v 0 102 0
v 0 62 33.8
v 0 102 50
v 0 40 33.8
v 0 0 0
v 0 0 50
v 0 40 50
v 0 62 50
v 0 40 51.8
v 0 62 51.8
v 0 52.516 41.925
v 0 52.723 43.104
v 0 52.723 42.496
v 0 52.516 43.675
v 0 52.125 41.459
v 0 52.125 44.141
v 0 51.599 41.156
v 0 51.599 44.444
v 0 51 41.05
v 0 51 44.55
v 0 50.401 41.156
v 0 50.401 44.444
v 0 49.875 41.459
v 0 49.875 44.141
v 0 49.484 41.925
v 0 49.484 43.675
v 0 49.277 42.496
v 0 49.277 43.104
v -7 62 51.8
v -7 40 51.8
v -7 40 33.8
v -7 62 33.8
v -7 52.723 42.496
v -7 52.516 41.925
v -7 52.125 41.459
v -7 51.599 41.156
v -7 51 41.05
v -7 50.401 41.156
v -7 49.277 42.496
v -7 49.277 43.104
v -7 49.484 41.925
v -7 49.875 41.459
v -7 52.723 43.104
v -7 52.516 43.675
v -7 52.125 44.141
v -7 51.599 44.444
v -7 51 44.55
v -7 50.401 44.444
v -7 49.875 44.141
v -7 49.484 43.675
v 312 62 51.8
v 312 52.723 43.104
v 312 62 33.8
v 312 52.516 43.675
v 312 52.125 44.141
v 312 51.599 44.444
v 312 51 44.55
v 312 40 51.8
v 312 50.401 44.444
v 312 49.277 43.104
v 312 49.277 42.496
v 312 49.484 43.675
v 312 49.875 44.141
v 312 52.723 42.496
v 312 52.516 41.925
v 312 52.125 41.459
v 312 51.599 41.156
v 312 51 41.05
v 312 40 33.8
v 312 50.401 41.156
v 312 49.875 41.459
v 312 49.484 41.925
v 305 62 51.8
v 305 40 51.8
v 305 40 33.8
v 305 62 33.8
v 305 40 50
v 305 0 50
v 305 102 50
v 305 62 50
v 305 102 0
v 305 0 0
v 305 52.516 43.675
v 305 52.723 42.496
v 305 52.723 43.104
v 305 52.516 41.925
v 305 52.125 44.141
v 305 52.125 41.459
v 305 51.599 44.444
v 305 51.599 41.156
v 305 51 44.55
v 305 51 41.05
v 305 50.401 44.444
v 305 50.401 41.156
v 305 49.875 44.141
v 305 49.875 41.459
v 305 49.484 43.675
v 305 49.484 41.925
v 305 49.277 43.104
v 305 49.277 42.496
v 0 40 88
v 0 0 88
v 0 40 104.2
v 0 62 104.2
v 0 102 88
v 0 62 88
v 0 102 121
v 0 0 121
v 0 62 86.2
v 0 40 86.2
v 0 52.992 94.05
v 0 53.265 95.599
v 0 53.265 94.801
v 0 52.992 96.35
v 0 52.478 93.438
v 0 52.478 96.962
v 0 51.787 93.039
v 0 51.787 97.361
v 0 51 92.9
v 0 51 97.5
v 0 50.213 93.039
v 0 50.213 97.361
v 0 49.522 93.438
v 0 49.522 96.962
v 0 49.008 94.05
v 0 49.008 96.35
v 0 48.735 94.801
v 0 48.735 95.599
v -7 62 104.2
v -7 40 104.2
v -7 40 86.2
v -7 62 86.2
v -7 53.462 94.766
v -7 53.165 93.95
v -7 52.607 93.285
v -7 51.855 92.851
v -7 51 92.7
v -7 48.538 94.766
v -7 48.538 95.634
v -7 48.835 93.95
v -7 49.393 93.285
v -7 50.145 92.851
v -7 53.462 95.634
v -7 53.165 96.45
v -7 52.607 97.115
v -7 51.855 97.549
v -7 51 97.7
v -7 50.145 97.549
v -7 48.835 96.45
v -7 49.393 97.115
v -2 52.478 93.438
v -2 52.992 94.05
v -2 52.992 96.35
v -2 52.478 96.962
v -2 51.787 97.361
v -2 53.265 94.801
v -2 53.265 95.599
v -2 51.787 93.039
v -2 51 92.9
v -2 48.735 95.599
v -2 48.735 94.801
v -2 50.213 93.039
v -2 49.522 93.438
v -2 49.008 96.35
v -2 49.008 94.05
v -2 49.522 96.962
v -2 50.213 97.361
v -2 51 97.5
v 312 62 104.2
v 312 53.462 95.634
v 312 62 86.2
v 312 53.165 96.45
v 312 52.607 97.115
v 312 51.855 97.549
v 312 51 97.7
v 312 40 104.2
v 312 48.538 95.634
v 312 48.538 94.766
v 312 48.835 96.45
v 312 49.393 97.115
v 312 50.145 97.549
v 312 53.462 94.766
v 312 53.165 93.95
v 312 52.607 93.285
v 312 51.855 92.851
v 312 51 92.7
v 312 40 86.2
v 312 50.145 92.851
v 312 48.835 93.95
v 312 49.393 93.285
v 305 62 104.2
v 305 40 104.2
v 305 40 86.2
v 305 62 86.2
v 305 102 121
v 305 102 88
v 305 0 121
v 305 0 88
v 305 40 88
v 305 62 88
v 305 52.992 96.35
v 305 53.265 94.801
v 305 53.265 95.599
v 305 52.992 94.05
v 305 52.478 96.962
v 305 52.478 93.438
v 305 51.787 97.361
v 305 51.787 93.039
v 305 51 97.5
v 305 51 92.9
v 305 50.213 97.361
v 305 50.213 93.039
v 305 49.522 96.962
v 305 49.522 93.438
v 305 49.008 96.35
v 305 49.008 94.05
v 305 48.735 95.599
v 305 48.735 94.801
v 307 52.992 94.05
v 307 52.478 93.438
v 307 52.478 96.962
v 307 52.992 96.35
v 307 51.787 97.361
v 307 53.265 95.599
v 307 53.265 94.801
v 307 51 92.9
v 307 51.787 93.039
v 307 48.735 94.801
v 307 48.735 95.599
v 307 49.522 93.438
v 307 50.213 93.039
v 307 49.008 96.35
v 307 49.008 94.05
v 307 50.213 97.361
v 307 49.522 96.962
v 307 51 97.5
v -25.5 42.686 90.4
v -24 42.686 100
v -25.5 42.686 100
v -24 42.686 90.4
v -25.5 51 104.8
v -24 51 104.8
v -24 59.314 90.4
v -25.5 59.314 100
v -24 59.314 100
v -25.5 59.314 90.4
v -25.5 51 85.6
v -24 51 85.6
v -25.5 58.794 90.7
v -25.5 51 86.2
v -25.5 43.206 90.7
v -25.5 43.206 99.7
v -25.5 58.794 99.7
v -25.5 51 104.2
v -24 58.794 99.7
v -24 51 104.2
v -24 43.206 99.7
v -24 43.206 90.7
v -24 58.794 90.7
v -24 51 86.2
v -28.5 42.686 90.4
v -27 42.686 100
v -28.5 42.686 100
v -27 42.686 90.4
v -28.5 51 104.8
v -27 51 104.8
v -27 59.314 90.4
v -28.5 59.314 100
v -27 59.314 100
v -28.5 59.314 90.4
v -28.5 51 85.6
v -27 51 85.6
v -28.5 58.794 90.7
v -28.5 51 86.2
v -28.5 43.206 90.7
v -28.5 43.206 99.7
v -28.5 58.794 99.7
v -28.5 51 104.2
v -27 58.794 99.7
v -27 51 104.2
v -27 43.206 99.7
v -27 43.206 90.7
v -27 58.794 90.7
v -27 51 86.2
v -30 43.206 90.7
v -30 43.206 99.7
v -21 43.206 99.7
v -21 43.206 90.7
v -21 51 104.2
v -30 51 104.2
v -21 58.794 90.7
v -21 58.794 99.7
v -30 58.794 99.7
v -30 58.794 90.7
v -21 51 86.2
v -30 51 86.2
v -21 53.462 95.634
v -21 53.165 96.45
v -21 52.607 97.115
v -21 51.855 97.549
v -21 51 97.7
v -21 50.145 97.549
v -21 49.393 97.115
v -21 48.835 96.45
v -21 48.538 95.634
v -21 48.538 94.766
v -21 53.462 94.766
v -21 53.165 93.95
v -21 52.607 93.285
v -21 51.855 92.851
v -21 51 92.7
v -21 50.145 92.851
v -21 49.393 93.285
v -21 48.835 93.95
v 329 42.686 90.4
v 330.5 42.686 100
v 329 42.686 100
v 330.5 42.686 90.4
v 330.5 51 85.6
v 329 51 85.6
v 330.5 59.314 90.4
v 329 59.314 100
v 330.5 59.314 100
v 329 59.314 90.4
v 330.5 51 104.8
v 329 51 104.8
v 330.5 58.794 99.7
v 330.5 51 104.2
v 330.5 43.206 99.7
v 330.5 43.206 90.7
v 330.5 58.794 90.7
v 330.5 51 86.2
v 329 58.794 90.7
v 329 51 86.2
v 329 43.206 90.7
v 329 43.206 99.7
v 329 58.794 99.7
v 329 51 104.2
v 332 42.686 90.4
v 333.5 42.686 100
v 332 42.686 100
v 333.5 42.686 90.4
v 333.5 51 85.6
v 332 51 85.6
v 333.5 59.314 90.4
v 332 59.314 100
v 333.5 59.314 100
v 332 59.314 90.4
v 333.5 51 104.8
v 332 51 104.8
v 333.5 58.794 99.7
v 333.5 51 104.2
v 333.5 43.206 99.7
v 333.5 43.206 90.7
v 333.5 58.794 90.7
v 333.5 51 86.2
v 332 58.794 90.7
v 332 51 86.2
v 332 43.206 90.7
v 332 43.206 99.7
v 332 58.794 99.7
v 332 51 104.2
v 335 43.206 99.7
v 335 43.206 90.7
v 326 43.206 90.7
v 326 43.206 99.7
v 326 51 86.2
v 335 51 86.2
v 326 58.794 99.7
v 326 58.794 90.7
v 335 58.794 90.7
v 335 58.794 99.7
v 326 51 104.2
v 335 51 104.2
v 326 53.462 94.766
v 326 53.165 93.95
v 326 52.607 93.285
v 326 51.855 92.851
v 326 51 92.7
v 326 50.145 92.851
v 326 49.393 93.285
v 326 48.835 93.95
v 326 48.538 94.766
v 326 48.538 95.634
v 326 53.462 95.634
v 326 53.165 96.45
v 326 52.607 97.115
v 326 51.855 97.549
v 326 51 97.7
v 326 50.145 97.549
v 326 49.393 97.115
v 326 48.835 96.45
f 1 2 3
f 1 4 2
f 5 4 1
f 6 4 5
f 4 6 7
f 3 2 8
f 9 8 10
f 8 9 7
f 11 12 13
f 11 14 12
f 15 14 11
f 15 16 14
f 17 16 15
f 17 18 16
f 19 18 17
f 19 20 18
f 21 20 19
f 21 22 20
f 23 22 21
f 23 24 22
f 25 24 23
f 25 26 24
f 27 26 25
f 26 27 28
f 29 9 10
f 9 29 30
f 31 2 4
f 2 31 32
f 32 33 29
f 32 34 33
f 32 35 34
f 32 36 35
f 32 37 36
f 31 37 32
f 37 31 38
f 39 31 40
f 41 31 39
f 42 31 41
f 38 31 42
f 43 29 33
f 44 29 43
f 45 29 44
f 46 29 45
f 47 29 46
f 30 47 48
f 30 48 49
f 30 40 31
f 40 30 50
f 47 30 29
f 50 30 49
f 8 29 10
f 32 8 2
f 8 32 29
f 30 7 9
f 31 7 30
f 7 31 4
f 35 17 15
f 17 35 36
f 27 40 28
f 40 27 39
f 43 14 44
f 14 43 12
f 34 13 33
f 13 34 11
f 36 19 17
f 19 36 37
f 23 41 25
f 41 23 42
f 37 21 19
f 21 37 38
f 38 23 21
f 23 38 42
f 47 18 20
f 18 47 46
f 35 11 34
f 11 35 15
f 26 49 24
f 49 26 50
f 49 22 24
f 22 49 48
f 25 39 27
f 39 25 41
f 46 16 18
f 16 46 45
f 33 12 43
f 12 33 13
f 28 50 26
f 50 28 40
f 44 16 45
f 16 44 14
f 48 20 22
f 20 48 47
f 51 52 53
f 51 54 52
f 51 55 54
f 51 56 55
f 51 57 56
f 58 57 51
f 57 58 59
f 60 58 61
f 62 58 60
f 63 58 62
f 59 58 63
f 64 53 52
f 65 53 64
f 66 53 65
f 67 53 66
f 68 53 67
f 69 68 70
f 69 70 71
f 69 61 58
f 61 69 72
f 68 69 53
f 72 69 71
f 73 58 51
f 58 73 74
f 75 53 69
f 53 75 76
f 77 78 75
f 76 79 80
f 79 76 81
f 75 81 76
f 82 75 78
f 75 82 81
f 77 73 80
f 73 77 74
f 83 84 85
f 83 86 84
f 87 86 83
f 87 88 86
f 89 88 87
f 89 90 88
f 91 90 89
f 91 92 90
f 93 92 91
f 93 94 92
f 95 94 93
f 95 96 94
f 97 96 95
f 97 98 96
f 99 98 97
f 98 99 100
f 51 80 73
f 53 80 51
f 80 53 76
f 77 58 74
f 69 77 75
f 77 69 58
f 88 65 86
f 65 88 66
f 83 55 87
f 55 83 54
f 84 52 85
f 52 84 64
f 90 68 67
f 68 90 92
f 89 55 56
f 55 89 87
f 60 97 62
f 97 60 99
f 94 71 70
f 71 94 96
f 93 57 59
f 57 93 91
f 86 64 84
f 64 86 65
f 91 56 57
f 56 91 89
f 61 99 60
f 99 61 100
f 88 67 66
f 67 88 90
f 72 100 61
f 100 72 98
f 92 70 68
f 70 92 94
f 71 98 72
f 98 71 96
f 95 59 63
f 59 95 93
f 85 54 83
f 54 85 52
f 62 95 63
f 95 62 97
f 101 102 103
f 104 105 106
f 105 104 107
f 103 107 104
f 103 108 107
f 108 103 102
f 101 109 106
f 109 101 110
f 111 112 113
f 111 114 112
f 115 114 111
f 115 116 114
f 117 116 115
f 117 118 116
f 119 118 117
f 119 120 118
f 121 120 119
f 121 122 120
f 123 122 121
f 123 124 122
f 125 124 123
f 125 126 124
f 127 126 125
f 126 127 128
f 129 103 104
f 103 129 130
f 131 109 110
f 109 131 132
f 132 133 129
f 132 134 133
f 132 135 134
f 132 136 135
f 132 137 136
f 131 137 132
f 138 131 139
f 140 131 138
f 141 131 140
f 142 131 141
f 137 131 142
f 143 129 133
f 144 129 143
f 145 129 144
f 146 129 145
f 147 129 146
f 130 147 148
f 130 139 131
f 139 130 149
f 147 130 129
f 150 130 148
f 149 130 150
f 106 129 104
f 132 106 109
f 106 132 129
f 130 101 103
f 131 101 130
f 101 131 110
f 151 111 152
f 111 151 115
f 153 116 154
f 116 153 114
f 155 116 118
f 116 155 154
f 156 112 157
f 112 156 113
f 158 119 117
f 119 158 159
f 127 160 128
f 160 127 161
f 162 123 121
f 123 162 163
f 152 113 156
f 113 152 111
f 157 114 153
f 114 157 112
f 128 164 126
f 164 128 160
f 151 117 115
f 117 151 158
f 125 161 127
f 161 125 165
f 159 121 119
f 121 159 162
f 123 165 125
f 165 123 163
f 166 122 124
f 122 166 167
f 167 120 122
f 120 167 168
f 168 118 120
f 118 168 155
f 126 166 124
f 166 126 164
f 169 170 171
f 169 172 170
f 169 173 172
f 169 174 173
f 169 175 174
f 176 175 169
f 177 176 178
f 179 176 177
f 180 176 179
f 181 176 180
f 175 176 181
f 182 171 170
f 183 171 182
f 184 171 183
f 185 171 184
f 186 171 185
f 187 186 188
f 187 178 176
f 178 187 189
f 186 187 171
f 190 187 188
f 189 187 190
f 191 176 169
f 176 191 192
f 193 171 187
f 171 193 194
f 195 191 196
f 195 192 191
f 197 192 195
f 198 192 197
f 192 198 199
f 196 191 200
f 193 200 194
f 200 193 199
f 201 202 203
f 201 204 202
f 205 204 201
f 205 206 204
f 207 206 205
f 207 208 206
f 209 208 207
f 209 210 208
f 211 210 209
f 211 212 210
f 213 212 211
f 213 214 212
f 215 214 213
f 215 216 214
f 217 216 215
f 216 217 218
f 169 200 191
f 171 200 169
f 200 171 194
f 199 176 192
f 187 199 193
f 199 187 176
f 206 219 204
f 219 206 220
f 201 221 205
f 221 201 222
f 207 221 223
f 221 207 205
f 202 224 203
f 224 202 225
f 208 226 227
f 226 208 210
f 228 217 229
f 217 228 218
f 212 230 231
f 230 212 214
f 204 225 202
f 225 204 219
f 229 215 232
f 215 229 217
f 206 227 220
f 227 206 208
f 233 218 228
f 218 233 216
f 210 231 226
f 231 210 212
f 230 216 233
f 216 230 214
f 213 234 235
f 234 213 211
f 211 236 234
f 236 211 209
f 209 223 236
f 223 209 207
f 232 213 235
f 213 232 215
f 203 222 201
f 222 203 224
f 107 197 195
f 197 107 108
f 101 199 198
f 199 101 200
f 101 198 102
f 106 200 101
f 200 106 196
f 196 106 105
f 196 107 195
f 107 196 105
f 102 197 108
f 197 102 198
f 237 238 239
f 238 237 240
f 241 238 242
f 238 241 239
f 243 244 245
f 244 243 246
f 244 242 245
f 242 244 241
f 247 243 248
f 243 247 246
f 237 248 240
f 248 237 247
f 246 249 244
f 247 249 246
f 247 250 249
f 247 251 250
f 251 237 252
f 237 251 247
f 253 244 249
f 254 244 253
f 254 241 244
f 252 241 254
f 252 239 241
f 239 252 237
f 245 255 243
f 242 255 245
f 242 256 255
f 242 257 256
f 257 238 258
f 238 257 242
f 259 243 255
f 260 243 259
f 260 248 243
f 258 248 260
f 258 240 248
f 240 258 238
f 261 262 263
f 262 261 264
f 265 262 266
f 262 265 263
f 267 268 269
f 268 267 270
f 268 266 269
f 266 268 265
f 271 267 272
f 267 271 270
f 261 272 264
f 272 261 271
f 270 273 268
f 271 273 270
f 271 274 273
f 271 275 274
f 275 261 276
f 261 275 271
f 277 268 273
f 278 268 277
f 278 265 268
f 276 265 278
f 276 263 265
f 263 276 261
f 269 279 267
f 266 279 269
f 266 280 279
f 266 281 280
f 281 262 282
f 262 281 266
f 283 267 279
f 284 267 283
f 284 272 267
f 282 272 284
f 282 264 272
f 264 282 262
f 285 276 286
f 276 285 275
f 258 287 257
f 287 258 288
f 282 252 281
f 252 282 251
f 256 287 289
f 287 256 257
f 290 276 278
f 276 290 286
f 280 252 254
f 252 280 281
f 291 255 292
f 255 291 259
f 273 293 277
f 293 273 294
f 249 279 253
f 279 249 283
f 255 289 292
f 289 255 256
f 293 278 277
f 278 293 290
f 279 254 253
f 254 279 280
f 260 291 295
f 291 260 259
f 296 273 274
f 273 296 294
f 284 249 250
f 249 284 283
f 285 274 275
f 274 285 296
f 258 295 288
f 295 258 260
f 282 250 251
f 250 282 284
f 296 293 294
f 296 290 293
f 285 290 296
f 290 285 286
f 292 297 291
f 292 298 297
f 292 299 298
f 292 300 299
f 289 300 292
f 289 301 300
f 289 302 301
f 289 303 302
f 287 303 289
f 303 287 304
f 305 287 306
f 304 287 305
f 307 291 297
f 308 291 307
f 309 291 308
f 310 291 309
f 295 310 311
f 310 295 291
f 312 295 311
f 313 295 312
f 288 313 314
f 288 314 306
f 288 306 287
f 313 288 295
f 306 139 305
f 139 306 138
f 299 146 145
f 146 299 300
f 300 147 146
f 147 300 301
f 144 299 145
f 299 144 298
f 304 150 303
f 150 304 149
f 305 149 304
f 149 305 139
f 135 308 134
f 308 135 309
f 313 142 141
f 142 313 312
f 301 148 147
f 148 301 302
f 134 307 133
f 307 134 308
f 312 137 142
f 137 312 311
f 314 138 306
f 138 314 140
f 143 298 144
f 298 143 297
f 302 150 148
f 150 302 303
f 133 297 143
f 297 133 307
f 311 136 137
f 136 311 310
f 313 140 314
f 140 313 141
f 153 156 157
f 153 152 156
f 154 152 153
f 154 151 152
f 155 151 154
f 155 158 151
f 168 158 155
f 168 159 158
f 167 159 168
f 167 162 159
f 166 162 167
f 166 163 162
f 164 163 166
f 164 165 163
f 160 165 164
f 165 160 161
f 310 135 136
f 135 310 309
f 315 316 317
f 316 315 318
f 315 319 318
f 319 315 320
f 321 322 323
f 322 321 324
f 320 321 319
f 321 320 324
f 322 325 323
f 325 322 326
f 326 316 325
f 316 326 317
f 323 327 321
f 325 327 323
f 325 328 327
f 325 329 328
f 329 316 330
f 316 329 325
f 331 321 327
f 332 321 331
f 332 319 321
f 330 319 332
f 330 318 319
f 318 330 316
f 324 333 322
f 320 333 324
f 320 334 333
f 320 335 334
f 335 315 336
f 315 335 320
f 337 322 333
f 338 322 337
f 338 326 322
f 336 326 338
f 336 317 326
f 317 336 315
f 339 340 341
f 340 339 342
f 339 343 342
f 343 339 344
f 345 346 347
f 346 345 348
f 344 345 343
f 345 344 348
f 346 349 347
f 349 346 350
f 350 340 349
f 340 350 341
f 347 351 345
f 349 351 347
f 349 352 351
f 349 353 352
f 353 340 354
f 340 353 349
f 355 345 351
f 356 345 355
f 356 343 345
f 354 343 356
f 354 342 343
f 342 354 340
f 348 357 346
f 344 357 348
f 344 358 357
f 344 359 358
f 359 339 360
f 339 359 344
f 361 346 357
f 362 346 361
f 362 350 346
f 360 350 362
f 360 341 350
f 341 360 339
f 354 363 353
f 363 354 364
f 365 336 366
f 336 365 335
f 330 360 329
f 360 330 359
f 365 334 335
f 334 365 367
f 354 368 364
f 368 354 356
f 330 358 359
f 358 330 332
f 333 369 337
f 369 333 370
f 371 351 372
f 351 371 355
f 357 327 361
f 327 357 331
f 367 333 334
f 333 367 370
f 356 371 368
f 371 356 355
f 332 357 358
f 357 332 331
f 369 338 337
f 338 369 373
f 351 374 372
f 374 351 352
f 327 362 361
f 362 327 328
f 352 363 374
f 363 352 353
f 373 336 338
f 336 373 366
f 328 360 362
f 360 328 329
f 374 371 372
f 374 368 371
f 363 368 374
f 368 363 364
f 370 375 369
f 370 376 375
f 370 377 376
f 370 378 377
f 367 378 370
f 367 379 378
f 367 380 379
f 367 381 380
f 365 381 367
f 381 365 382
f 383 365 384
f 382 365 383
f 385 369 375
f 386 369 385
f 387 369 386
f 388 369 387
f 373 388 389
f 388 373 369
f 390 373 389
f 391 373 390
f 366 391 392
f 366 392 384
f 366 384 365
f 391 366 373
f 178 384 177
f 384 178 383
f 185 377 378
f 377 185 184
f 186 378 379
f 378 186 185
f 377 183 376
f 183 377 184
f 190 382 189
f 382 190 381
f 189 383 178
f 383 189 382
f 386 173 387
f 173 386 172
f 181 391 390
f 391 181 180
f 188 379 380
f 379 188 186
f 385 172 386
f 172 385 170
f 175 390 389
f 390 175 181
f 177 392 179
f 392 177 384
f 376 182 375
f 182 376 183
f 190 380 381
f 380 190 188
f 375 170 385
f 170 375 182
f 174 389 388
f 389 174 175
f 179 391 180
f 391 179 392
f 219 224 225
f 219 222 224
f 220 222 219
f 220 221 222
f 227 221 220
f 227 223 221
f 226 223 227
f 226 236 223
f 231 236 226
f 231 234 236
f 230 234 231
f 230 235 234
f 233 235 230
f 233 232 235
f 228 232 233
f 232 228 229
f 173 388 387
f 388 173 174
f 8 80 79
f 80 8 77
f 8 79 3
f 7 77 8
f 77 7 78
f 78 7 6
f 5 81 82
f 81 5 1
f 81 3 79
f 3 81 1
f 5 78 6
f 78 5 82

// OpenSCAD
// 04_captive_thumbscrew_boss.scad
// Printed ear-boss on each short end of the lower tray (outer face, near top).
// A matching flange ear on the upper tray aligns over it.
// An M4 thumbscrew passes through the upper flange and threads into the lower boss,
// clamping the trays together. One boss per short end (2 total).
// ENGAGE: press trays together, twist thumbscrew finger-tight.
// RELEASE: unscrew thumbscrew ~5 turns; lift upper tray.
//
// explode=0  → engaged
// explode=38 → exploded/open

explode = 38;

lx=305; ly=102; lz=50;
ux=305; uy=102; uz=33;

m4_clear  = 4.6;   // clearance hole Ø
m4_tap    = 3.5;   // printed thread Ø
ear_w     = 22;    // ear width in Y (centred on tray)
ear_h     = 18;    // ear height in Z
ear_t     = 7;     // ear protrusion in X from end face
knurl_d   = 18;    // thumbscrew head Ø
knurl_h   = 9;
shaft_d   = 5;

// Lower ear is at top of lower tray, centred at Z = lz - ear_h*0.4
// so ~60% of ear height is in lower tray, ~40% straddles the joint
lower_ear_cz = lz - ear_h * 0.4;
// Upper flange ear mirrors: in upper tray local Z it's at +ear_h*0.4
upper_ear_cz_local = ear_h * 0.4;  // in upper tray local coords

module lower_tray() { color("SteelBlue",0.85)    cube([lx,ly,lz]); }
module upper_tray() { color("LightSkyBlue",0.85) cube([ux,uy,uz]); }

// Ear protruding outward from end face
module ear_body(side, x_off, cz, tapped) {
    x0 = (side==0) ? x_off - ear_t : x_off;
    difference() {
        translate([x0, ly/2 - ear_w/2, cz - ear_h/2])
            cube([ear_t, ear_w, ear_h]);
        translate([(side==0) ? x0-0.1 : x0-0.1, ly/2, cz])
            rotate([0, 90, 0])
                cylinder(d = tapped ? m4_tap : m4_clear, h=ear_t+0.2, $fn=18);
    }
}

// Lower tray + lower ears
lower_tray();
color("DarkOrange",0.92)
for(s=[0,1]) {
    x_off = (s==0) ? 0 : lx;
    ear_body(s, x_off, lower_ear_cz, true);
}

// Upper tray + upper flanges (lifted by explode)
translate([0, 0, lz + explode]) {
    upper_tray();
    color("CornflowerBlue",0.92)
    for(s=[0,1]) {
        x_off = (s==0) ? 0 : ux;
        ear_body(s, x_off, upper_ear_cz_local, false);
    }
}

// Thumbscrews — shown alongside upper tray when exploded
// World Z of upper ear centres = lz + explode + upper_ear_cz_local
for(s=[0,1]) {
    ear_world_z = lz + explode + upper_ear_cz_local;
    head_x = (s==0) ? -(ear_t + knurl_h + 5) : lx + ear_t + knurl_h + 5;
    color("Silver",0.95)
    translate([head_x, ly/2, ear_world_z])
    rotate([0, (s==0) ? -90 : 90, 0]) {
        cylinder(d=knurl_d, h=knurl_h, $fn=6);
        for(i=[1,2])
            translate([0,0, i*(knurl_h/3)])
                difference() {
                    cylinder(d=knurl_d+1.2, h=1.5, $fn=6);
                    cylinder(d=knurl_d-0.5, h=1.5, $fn=6);
                }
        translate([0, 0, -ear_t-12])
            cylinder(d=shaft_d, h=ear_t+12, $fn=18);
    }
}
